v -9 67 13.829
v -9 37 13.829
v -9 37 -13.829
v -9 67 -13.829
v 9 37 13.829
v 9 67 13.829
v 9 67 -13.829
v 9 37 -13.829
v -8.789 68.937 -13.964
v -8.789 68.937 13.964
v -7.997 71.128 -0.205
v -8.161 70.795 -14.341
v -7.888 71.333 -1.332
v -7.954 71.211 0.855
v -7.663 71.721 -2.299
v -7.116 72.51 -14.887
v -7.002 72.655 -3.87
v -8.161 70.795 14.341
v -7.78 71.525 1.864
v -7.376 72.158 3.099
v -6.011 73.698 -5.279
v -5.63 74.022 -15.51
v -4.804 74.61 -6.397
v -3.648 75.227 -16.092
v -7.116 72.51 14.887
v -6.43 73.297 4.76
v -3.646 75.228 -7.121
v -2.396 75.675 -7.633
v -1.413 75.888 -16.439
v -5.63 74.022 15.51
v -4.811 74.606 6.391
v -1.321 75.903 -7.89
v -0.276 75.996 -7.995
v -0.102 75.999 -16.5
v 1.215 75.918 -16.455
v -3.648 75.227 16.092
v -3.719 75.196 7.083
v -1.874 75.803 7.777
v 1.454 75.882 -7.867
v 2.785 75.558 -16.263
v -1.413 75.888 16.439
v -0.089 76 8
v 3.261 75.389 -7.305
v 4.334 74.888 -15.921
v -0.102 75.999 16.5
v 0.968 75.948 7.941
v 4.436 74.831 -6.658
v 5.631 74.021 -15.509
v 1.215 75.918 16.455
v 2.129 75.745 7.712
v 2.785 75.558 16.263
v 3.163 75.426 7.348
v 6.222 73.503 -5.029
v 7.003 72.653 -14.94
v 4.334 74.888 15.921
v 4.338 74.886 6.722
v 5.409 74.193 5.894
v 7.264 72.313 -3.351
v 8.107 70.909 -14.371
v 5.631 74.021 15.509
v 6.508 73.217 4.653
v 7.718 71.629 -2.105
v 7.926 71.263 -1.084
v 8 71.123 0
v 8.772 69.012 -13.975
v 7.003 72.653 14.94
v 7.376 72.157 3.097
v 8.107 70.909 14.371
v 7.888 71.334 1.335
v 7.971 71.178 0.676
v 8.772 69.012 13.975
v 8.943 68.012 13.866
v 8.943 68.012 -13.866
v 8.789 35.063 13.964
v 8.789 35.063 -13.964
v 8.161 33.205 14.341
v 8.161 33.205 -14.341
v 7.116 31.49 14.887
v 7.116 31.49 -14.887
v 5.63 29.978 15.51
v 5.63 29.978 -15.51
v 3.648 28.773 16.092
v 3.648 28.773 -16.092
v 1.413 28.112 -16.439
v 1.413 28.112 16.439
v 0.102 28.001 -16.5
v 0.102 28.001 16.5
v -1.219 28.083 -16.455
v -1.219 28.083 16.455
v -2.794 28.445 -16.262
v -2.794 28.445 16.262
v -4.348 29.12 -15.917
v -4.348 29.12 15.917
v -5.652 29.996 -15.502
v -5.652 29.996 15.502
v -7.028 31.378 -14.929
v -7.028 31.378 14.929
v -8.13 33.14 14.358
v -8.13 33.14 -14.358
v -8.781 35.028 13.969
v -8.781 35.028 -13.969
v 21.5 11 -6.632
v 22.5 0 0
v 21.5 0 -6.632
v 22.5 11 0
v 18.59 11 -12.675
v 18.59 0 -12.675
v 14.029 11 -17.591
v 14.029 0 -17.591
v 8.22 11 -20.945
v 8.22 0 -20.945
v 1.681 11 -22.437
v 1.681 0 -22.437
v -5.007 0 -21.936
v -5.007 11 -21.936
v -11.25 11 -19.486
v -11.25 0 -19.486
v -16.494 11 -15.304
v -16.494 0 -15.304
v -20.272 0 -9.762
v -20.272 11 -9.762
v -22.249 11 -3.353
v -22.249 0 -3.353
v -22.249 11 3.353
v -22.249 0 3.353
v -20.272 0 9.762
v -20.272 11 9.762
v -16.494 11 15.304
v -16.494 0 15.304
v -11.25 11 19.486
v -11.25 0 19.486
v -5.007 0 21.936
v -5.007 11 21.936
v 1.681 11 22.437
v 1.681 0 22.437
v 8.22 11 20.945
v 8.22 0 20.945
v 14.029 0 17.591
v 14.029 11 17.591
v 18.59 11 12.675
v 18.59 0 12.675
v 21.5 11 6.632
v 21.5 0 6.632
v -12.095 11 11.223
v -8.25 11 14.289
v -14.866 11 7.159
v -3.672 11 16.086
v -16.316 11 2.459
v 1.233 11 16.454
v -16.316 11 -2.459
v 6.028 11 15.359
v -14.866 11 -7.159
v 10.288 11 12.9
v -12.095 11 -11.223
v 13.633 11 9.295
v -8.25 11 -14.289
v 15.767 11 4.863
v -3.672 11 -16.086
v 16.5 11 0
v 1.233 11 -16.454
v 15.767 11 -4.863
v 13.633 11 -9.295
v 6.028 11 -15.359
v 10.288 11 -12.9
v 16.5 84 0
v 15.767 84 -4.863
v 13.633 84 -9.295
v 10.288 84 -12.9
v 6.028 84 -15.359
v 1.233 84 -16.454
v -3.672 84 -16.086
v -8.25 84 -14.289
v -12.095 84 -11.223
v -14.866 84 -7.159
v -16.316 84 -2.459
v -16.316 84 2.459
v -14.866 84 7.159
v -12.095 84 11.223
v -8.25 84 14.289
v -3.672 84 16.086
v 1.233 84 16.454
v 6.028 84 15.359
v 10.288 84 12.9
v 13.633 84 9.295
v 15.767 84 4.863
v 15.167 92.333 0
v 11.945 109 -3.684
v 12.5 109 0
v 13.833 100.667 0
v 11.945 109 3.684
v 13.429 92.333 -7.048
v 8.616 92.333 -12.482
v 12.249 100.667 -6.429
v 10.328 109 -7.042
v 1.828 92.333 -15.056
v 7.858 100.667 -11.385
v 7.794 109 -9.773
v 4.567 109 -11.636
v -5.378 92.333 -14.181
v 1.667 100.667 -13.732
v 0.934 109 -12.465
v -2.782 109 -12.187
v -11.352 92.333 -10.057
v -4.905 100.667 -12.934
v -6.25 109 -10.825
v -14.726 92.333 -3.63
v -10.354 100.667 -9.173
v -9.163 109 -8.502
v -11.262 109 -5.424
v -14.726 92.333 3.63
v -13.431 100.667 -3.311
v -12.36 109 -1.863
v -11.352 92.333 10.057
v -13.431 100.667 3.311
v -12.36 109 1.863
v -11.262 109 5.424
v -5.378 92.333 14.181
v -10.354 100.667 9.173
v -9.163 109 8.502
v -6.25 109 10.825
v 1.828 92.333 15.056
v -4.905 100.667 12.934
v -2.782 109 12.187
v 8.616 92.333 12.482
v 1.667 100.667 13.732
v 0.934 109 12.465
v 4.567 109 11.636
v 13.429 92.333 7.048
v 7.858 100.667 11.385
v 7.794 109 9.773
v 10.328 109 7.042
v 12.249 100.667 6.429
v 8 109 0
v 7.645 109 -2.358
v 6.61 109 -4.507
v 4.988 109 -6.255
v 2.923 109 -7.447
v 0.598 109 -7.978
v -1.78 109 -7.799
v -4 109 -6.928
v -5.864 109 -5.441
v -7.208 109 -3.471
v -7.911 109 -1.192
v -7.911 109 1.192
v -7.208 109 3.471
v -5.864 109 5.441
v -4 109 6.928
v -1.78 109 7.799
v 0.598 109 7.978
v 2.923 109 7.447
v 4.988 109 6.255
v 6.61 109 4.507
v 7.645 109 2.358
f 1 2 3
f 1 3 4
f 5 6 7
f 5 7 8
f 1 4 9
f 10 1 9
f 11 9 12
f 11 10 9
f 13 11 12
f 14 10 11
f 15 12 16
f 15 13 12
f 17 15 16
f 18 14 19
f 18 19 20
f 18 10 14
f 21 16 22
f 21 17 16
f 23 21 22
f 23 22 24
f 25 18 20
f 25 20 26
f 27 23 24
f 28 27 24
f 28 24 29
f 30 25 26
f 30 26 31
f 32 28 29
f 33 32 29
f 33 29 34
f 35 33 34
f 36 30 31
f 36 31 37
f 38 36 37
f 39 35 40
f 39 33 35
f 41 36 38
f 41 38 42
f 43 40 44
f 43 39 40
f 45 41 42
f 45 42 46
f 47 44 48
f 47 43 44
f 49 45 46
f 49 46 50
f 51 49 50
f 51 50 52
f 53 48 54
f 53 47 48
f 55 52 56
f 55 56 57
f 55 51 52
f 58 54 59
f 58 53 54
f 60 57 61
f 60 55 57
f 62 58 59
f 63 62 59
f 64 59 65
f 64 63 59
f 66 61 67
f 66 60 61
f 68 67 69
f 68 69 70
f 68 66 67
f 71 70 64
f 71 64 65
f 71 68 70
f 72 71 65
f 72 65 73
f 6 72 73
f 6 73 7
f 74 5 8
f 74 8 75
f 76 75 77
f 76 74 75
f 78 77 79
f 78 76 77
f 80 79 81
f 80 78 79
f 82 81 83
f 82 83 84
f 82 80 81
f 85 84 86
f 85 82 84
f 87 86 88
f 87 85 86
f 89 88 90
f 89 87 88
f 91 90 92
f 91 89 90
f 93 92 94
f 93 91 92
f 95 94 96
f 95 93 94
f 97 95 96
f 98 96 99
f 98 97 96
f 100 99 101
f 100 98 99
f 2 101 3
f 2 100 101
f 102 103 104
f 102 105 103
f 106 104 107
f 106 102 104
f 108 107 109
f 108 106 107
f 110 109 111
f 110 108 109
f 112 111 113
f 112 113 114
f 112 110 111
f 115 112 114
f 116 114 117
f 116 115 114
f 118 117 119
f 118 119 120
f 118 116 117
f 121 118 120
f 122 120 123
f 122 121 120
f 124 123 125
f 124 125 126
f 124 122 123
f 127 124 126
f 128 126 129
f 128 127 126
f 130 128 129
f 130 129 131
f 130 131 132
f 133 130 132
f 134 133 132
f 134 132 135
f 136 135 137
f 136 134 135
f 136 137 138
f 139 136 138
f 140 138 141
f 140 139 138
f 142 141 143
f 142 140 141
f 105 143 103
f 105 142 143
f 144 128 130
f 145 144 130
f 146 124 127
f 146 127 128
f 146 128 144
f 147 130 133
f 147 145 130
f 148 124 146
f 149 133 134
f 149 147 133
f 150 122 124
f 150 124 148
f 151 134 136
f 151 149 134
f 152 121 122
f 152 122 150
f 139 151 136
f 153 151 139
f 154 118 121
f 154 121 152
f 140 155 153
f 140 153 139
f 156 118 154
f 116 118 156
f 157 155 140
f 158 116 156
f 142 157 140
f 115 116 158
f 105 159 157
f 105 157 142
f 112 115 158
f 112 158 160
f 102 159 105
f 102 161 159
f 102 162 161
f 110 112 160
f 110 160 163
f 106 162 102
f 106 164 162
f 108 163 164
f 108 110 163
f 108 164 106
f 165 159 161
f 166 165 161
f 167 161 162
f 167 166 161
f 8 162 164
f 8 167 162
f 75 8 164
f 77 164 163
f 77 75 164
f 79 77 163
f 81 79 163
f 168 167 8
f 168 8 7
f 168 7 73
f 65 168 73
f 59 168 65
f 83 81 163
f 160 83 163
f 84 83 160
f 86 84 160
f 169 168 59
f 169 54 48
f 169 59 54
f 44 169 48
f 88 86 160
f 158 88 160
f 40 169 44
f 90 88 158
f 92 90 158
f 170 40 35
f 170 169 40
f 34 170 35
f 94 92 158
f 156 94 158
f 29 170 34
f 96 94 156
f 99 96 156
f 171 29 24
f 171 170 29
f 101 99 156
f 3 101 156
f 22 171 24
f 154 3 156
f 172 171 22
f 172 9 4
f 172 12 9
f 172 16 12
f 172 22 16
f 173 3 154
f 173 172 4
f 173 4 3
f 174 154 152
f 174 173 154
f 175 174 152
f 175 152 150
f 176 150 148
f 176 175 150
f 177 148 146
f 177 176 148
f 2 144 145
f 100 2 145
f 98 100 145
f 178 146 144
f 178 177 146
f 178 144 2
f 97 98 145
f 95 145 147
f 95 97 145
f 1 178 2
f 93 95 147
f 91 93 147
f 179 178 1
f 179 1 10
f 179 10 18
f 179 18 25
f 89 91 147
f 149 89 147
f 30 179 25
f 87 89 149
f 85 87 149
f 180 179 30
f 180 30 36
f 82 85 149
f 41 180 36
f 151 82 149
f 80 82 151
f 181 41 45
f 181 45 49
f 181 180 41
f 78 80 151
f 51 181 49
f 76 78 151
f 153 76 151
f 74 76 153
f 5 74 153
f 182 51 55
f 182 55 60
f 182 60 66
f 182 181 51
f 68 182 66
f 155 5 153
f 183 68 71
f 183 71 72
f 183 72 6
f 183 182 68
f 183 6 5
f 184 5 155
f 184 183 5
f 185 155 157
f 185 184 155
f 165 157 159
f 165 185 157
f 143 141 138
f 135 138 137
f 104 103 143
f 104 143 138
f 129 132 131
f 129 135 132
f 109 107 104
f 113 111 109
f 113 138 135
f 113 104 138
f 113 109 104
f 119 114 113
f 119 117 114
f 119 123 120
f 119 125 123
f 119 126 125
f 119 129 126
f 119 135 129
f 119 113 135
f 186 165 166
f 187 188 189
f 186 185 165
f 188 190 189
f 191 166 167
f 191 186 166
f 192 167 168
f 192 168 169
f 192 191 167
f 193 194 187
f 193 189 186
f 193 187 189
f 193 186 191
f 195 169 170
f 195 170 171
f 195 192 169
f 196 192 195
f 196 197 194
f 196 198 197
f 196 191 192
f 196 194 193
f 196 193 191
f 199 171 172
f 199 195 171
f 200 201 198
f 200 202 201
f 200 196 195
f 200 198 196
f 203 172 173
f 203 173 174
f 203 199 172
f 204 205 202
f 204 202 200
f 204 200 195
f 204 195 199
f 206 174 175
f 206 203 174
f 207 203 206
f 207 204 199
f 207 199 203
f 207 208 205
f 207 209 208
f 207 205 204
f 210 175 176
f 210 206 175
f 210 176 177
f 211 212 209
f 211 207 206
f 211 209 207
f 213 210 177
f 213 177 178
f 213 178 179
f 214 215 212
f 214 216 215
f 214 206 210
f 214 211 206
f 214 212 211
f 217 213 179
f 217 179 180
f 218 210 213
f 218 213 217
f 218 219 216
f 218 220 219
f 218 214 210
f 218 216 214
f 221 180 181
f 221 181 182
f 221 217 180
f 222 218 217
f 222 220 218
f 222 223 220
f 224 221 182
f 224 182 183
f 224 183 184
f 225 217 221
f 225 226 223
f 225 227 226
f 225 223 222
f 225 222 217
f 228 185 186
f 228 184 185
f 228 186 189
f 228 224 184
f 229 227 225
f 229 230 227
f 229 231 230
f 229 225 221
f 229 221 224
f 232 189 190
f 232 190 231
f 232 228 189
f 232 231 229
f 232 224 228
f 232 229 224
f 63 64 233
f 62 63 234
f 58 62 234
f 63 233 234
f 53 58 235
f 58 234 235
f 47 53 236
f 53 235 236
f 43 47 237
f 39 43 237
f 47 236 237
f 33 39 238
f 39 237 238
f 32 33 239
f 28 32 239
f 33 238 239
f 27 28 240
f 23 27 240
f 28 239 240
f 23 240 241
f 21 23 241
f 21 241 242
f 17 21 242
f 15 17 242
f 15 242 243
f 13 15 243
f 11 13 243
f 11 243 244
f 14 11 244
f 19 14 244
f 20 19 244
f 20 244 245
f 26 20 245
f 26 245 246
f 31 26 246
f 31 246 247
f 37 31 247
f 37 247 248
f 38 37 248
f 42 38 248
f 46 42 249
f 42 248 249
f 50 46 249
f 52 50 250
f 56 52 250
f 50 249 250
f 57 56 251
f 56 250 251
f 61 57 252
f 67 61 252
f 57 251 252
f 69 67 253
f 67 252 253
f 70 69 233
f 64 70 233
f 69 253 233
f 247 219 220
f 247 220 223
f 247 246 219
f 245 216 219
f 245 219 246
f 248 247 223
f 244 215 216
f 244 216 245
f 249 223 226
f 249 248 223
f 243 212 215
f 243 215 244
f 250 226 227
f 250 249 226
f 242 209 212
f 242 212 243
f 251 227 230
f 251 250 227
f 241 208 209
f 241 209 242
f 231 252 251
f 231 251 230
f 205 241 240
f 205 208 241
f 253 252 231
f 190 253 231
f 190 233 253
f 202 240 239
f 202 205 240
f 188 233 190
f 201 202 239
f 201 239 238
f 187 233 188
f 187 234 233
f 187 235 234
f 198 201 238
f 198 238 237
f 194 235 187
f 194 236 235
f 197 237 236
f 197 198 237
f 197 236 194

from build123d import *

# Parameters (mm, degrees)
CUT_EXTRUDE1_DEPTH      = 23.5
CUT_EXTRUDE1_DEPTH_BACK = 23.5
CUT_EXTRUDE2_REACH      = 111
SKETCH3_R               = 8


with BuildPart() as part:
    # Sketch1 → Revolve1 (revolve)
    with BuildSketch(Plane.XY):
        Polygon((0, 0), (22.5, 0), (22.5, 11), (16.5, 11), (16.5, 84), (12.5, 109), (0, 109), align=None)
    revolve(axis=Axis((0, 0, 0), (0, 1, 0)))

    # Sketch2 → Cut-Extrude1 (cut, two sides)
    with BuildSketch(Plane.XY) as cut_extrude1_sk:
        with BuildLine():
            Line((9, 67), (9, 37))
            ThreePointArc((9, 37), (0, 28), (-9, 37))
            Line((-9, 37), (-9, 67))
            ThreePointArc((-9, 67), (0, 76), (9, 67))
        make_face()
    extrude(amount=CUT_EXTRUDE1_DEPTH, mode=Mode.SUBTRACT)
    extrude(cut_extrude1_sk.sketch, amount=-CUT_EXTRUDE1_DEPTH_BACK, mode=Mode.SUBTRACT)

    # Sketch3 → Cut-Extrude2 (cut, up to next)
    with BuildSketch(Plane(origin=(0, 109, 0), x_dir=(1, 0, 0), z_dir=(0, 1, 0)), mode=Mode.PRIVATE) as cut_extrude2_sk1:
        Circle(SKETCH3_R)
    cut_extrude2_tool1 = extrude(cut_extrude2_sk1.sketch, amount=-CUT_EXTRUDE2_REACH, mode=Mode.PRIVATE) & part.part
    add(cut_extrude2_tool1.solids().sort_by_distance((0, 109, 0))[0], mode=Mode.SUBTRACT)


solid = part.part
